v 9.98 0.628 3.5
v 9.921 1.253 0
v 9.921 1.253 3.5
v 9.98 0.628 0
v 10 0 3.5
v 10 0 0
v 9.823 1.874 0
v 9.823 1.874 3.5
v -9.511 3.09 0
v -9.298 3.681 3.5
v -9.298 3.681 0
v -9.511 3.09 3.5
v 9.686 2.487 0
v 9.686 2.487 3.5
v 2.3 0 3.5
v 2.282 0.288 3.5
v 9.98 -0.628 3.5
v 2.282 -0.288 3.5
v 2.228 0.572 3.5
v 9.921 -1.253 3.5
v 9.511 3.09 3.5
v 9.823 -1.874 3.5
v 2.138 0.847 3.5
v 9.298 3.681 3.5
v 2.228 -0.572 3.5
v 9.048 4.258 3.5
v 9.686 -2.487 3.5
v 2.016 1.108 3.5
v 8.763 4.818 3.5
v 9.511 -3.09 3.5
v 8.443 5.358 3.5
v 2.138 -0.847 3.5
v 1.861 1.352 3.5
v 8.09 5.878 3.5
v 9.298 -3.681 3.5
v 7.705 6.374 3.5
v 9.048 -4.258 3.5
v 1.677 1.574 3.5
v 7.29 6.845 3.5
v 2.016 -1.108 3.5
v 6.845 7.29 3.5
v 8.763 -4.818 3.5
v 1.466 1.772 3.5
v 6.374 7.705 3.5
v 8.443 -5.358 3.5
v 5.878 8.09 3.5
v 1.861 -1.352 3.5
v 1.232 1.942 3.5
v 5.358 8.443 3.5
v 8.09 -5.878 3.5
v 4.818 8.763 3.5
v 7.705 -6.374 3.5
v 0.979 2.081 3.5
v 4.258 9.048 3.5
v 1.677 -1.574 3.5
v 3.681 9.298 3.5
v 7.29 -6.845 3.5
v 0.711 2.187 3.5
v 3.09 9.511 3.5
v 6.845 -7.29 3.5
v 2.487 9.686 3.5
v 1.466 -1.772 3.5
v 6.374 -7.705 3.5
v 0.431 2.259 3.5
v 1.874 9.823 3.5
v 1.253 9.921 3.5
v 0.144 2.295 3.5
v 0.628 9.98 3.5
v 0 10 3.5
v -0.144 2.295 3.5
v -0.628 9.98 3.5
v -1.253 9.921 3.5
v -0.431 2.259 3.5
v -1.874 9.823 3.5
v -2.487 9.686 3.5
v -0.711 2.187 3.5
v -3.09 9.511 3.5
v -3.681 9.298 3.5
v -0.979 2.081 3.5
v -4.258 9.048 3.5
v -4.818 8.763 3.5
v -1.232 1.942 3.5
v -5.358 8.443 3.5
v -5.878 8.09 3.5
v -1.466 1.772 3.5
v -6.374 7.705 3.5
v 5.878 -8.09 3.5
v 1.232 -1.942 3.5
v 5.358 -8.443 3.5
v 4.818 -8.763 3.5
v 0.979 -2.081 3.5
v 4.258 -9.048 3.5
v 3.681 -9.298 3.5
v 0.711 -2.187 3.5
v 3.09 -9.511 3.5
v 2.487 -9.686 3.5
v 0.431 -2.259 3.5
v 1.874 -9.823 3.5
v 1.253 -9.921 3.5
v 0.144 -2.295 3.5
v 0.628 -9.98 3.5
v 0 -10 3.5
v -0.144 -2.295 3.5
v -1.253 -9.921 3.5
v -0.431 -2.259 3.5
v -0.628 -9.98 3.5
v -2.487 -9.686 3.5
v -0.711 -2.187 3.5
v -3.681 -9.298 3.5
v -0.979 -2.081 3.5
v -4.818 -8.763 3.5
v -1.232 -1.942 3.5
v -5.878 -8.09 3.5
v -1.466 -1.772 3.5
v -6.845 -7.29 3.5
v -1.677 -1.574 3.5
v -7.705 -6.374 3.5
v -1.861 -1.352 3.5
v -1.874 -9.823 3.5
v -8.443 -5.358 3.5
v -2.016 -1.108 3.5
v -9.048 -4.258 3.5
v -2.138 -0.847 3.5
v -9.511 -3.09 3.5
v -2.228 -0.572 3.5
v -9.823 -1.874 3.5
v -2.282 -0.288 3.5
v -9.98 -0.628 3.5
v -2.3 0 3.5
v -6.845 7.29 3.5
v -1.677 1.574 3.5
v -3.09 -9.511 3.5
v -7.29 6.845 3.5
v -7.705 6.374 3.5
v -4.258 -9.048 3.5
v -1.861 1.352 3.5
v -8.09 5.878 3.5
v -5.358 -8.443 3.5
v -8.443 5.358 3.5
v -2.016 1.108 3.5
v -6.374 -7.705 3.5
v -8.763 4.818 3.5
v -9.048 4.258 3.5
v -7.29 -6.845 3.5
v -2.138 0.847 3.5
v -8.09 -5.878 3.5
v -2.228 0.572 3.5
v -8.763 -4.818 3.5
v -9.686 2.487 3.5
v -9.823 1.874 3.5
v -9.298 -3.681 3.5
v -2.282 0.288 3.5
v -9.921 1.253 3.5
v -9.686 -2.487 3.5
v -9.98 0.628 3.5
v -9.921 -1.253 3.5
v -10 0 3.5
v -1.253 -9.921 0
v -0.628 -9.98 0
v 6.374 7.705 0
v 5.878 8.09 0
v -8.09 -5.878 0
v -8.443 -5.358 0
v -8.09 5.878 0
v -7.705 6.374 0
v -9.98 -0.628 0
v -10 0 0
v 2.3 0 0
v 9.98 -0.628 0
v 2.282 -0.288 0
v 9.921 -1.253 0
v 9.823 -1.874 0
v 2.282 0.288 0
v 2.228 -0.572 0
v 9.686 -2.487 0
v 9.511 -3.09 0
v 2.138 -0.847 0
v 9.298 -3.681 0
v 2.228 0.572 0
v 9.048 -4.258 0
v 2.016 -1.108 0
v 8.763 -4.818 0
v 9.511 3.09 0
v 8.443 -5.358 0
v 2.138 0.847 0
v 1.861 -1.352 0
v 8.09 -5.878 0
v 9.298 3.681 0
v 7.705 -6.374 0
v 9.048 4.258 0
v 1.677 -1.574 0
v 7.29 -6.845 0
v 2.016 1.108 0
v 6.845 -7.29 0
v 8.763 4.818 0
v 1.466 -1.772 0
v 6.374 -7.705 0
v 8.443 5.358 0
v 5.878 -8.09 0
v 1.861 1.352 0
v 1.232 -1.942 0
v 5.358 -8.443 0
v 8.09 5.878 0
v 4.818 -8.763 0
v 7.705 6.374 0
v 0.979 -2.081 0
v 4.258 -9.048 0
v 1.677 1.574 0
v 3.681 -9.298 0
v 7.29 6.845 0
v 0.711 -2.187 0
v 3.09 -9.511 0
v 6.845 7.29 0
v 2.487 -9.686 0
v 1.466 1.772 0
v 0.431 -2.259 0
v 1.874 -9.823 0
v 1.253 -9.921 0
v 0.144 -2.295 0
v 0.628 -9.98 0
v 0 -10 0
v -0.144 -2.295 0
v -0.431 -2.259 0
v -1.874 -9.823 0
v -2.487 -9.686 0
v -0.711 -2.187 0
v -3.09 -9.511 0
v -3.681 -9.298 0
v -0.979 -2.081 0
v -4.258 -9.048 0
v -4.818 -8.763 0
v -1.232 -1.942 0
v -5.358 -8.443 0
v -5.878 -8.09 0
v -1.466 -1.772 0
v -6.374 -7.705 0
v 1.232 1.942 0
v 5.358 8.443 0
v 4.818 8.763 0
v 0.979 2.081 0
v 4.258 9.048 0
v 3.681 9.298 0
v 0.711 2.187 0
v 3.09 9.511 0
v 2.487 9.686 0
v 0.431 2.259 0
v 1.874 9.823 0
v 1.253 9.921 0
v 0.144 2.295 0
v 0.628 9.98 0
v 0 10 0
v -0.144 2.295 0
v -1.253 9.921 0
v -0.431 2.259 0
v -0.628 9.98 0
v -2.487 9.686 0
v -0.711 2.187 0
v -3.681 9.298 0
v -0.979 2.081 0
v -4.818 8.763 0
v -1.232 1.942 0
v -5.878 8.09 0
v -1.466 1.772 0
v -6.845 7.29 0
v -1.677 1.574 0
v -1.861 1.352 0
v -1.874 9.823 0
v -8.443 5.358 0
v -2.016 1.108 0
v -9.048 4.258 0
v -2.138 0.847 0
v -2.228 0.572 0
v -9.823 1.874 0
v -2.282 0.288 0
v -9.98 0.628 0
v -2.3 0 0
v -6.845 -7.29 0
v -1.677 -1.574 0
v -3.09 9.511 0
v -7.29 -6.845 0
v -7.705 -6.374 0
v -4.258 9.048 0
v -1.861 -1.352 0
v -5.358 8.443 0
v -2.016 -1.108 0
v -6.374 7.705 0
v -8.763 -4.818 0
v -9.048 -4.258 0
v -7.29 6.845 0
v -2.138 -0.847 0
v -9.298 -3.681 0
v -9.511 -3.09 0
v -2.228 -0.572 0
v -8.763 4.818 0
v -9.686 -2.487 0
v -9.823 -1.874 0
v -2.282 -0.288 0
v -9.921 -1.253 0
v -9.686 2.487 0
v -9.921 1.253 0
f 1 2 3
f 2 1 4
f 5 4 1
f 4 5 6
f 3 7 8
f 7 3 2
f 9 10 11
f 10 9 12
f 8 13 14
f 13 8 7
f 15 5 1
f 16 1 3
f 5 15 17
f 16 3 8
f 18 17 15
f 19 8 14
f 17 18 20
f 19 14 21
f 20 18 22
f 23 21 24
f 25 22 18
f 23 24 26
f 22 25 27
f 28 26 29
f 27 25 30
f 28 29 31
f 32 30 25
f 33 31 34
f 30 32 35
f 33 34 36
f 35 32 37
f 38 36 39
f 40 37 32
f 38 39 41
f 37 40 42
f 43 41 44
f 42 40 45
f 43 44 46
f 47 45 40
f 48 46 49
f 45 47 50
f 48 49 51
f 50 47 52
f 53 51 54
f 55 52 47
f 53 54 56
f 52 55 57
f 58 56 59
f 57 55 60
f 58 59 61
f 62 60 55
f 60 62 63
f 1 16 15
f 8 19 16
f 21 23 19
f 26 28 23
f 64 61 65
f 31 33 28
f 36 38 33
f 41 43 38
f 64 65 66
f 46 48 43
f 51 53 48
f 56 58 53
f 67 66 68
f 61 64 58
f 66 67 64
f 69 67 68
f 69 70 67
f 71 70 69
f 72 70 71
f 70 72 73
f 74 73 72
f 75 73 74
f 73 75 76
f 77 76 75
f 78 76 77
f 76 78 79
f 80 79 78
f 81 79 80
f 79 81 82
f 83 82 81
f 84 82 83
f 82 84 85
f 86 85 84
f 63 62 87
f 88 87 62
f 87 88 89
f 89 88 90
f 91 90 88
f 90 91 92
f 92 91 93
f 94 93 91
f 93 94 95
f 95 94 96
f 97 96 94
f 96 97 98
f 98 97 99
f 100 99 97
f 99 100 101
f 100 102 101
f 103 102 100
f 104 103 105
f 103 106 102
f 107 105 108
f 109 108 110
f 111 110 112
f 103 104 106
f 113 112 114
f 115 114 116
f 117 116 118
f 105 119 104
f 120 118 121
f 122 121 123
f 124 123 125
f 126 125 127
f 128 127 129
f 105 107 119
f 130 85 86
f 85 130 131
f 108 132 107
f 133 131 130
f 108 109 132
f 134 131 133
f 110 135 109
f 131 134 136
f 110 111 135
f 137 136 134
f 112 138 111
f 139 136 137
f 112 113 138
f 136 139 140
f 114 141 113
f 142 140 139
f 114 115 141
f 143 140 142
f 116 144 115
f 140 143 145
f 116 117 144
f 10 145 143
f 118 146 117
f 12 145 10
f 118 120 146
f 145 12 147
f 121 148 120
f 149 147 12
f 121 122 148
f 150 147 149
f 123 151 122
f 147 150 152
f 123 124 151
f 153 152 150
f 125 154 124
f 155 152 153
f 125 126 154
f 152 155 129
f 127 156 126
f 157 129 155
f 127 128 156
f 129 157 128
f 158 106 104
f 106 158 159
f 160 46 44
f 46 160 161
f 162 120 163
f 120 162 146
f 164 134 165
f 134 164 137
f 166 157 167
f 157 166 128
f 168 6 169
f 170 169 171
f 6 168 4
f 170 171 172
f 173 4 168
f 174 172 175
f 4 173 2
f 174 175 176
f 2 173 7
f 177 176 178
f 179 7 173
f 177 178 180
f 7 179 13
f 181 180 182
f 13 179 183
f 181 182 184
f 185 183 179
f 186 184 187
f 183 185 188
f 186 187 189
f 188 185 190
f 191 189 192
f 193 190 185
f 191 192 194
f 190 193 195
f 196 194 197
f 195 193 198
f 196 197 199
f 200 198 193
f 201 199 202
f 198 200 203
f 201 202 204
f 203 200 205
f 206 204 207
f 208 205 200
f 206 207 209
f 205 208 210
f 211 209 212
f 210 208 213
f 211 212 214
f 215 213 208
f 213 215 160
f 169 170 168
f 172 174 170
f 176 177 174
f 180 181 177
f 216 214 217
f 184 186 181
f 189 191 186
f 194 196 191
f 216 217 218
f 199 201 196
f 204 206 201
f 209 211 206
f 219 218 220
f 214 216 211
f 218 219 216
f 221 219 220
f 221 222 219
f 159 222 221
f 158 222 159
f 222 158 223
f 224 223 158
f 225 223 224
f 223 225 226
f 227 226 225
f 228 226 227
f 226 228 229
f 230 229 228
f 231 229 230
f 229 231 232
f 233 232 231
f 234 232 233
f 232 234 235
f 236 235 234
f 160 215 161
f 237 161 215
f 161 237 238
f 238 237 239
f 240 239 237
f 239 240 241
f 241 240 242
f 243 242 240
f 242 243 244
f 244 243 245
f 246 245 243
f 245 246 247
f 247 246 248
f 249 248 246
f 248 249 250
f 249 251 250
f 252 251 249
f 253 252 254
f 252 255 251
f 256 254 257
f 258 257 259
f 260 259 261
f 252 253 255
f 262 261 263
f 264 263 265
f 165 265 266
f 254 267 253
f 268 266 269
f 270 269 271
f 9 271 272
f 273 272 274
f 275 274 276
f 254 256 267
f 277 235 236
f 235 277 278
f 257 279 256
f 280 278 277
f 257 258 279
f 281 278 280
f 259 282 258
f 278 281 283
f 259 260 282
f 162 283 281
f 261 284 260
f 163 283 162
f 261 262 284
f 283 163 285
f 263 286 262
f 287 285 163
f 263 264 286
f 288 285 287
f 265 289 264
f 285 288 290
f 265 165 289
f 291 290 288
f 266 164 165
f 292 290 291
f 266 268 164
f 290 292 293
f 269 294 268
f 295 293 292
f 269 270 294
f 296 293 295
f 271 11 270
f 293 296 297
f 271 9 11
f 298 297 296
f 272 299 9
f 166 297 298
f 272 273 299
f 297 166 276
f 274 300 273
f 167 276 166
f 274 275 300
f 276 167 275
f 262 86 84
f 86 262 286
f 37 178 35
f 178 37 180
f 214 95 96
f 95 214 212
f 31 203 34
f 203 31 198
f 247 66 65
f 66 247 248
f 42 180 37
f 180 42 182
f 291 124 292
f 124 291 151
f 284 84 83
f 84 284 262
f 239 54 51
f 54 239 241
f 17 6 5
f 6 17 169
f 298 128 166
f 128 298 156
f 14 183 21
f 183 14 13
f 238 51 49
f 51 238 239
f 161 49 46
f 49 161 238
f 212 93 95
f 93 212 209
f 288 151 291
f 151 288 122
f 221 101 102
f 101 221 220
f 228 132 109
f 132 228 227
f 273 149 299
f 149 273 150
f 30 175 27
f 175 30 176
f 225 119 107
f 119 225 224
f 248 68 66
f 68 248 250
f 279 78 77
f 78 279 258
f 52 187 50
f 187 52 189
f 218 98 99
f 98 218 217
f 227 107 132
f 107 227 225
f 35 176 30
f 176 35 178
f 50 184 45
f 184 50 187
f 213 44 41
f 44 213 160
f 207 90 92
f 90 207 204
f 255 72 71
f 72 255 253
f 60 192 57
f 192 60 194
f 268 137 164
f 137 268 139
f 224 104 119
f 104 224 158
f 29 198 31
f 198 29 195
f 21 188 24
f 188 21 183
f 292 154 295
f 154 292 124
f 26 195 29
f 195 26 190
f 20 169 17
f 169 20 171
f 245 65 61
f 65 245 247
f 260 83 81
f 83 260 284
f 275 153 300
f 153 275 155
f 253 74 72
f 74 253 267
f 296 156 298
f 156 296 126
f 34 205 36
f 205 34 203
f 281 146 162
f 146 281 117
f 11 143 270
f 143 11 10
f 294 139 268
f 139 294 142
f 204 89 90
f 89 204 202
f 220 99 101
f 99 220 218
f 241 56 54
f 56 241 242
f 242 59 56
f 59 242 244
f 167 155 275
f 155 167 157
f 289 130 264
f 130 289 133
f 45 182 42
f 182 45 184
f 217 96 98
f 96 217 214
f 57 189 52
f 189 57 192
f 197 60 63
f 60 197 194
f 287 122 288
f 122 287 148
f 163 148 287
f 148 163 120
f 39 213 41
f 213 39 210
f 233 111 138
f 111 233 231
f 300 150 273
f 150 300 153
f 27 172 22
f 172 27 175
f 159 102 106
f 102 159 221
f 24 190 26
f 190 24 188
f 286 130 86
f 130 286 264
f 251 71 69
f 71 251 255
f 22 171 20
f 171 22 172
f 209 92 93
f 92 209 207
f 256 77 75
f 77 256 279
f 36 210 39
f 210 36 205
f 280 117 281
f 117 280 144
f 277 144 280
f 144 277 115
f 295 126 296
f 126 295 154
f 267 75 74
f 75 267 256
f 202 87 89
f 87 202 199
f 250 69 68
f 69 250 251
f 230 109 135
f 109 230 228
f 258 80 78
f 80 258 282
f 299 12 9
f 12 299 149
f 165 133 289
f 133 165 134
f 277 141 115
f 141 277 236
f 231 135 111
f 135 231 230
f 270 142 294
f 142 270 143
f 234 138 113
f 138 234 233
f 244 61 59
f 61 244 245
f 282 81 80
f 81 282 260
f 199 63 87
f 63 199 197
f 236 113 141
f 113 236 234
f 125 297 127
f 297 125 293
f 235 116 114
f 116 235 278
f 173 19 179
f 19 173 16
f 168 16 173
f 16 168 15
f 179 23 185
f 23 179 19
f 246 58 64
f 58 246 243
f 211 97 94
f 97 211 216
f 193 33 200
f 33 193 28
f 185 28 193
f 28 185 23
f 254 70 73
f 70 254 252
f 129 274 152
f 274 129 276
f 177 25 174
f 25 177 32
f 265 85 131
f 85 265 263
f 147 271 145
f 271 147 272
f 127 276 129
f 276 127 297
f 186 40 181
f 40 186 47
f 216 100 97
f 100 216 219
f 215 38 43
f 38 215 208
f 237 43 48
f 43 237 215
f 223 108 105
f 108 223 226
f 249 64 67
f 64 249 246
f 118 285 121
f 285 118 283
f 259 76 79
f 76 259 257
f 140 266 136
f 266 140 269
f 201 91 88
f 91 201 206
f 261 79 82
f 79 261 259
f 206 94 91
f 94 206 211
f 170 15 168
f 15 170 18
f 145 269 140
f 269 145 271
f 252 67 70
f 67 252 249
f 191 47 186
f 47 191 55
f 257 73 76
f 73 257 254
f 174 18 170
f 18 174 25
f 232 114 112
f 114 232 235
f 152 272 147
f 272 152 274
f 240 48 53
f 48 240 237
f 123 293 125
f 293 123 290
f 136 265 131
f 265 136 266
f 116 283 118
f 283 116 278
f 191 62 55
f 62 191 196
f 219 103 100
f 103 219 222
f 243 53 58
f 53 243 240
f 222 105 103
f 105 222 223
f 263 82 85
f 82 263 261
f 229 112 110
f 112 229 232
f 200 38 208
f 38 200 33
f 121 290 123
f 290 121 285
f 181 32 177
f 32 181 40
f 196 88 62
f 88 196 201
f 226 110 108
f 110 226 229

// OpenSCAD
module separator(diameter = 20, height = 3.5, bolt_diameter = 4.6) {
  difference() {
    cylinder(d = diameter, h = height, $fn = 100);
    translate([0, 0, -1])
      cylinder(d = bolt_diameter, h = height + 2, $fn = 50);
  }
}

separator();
